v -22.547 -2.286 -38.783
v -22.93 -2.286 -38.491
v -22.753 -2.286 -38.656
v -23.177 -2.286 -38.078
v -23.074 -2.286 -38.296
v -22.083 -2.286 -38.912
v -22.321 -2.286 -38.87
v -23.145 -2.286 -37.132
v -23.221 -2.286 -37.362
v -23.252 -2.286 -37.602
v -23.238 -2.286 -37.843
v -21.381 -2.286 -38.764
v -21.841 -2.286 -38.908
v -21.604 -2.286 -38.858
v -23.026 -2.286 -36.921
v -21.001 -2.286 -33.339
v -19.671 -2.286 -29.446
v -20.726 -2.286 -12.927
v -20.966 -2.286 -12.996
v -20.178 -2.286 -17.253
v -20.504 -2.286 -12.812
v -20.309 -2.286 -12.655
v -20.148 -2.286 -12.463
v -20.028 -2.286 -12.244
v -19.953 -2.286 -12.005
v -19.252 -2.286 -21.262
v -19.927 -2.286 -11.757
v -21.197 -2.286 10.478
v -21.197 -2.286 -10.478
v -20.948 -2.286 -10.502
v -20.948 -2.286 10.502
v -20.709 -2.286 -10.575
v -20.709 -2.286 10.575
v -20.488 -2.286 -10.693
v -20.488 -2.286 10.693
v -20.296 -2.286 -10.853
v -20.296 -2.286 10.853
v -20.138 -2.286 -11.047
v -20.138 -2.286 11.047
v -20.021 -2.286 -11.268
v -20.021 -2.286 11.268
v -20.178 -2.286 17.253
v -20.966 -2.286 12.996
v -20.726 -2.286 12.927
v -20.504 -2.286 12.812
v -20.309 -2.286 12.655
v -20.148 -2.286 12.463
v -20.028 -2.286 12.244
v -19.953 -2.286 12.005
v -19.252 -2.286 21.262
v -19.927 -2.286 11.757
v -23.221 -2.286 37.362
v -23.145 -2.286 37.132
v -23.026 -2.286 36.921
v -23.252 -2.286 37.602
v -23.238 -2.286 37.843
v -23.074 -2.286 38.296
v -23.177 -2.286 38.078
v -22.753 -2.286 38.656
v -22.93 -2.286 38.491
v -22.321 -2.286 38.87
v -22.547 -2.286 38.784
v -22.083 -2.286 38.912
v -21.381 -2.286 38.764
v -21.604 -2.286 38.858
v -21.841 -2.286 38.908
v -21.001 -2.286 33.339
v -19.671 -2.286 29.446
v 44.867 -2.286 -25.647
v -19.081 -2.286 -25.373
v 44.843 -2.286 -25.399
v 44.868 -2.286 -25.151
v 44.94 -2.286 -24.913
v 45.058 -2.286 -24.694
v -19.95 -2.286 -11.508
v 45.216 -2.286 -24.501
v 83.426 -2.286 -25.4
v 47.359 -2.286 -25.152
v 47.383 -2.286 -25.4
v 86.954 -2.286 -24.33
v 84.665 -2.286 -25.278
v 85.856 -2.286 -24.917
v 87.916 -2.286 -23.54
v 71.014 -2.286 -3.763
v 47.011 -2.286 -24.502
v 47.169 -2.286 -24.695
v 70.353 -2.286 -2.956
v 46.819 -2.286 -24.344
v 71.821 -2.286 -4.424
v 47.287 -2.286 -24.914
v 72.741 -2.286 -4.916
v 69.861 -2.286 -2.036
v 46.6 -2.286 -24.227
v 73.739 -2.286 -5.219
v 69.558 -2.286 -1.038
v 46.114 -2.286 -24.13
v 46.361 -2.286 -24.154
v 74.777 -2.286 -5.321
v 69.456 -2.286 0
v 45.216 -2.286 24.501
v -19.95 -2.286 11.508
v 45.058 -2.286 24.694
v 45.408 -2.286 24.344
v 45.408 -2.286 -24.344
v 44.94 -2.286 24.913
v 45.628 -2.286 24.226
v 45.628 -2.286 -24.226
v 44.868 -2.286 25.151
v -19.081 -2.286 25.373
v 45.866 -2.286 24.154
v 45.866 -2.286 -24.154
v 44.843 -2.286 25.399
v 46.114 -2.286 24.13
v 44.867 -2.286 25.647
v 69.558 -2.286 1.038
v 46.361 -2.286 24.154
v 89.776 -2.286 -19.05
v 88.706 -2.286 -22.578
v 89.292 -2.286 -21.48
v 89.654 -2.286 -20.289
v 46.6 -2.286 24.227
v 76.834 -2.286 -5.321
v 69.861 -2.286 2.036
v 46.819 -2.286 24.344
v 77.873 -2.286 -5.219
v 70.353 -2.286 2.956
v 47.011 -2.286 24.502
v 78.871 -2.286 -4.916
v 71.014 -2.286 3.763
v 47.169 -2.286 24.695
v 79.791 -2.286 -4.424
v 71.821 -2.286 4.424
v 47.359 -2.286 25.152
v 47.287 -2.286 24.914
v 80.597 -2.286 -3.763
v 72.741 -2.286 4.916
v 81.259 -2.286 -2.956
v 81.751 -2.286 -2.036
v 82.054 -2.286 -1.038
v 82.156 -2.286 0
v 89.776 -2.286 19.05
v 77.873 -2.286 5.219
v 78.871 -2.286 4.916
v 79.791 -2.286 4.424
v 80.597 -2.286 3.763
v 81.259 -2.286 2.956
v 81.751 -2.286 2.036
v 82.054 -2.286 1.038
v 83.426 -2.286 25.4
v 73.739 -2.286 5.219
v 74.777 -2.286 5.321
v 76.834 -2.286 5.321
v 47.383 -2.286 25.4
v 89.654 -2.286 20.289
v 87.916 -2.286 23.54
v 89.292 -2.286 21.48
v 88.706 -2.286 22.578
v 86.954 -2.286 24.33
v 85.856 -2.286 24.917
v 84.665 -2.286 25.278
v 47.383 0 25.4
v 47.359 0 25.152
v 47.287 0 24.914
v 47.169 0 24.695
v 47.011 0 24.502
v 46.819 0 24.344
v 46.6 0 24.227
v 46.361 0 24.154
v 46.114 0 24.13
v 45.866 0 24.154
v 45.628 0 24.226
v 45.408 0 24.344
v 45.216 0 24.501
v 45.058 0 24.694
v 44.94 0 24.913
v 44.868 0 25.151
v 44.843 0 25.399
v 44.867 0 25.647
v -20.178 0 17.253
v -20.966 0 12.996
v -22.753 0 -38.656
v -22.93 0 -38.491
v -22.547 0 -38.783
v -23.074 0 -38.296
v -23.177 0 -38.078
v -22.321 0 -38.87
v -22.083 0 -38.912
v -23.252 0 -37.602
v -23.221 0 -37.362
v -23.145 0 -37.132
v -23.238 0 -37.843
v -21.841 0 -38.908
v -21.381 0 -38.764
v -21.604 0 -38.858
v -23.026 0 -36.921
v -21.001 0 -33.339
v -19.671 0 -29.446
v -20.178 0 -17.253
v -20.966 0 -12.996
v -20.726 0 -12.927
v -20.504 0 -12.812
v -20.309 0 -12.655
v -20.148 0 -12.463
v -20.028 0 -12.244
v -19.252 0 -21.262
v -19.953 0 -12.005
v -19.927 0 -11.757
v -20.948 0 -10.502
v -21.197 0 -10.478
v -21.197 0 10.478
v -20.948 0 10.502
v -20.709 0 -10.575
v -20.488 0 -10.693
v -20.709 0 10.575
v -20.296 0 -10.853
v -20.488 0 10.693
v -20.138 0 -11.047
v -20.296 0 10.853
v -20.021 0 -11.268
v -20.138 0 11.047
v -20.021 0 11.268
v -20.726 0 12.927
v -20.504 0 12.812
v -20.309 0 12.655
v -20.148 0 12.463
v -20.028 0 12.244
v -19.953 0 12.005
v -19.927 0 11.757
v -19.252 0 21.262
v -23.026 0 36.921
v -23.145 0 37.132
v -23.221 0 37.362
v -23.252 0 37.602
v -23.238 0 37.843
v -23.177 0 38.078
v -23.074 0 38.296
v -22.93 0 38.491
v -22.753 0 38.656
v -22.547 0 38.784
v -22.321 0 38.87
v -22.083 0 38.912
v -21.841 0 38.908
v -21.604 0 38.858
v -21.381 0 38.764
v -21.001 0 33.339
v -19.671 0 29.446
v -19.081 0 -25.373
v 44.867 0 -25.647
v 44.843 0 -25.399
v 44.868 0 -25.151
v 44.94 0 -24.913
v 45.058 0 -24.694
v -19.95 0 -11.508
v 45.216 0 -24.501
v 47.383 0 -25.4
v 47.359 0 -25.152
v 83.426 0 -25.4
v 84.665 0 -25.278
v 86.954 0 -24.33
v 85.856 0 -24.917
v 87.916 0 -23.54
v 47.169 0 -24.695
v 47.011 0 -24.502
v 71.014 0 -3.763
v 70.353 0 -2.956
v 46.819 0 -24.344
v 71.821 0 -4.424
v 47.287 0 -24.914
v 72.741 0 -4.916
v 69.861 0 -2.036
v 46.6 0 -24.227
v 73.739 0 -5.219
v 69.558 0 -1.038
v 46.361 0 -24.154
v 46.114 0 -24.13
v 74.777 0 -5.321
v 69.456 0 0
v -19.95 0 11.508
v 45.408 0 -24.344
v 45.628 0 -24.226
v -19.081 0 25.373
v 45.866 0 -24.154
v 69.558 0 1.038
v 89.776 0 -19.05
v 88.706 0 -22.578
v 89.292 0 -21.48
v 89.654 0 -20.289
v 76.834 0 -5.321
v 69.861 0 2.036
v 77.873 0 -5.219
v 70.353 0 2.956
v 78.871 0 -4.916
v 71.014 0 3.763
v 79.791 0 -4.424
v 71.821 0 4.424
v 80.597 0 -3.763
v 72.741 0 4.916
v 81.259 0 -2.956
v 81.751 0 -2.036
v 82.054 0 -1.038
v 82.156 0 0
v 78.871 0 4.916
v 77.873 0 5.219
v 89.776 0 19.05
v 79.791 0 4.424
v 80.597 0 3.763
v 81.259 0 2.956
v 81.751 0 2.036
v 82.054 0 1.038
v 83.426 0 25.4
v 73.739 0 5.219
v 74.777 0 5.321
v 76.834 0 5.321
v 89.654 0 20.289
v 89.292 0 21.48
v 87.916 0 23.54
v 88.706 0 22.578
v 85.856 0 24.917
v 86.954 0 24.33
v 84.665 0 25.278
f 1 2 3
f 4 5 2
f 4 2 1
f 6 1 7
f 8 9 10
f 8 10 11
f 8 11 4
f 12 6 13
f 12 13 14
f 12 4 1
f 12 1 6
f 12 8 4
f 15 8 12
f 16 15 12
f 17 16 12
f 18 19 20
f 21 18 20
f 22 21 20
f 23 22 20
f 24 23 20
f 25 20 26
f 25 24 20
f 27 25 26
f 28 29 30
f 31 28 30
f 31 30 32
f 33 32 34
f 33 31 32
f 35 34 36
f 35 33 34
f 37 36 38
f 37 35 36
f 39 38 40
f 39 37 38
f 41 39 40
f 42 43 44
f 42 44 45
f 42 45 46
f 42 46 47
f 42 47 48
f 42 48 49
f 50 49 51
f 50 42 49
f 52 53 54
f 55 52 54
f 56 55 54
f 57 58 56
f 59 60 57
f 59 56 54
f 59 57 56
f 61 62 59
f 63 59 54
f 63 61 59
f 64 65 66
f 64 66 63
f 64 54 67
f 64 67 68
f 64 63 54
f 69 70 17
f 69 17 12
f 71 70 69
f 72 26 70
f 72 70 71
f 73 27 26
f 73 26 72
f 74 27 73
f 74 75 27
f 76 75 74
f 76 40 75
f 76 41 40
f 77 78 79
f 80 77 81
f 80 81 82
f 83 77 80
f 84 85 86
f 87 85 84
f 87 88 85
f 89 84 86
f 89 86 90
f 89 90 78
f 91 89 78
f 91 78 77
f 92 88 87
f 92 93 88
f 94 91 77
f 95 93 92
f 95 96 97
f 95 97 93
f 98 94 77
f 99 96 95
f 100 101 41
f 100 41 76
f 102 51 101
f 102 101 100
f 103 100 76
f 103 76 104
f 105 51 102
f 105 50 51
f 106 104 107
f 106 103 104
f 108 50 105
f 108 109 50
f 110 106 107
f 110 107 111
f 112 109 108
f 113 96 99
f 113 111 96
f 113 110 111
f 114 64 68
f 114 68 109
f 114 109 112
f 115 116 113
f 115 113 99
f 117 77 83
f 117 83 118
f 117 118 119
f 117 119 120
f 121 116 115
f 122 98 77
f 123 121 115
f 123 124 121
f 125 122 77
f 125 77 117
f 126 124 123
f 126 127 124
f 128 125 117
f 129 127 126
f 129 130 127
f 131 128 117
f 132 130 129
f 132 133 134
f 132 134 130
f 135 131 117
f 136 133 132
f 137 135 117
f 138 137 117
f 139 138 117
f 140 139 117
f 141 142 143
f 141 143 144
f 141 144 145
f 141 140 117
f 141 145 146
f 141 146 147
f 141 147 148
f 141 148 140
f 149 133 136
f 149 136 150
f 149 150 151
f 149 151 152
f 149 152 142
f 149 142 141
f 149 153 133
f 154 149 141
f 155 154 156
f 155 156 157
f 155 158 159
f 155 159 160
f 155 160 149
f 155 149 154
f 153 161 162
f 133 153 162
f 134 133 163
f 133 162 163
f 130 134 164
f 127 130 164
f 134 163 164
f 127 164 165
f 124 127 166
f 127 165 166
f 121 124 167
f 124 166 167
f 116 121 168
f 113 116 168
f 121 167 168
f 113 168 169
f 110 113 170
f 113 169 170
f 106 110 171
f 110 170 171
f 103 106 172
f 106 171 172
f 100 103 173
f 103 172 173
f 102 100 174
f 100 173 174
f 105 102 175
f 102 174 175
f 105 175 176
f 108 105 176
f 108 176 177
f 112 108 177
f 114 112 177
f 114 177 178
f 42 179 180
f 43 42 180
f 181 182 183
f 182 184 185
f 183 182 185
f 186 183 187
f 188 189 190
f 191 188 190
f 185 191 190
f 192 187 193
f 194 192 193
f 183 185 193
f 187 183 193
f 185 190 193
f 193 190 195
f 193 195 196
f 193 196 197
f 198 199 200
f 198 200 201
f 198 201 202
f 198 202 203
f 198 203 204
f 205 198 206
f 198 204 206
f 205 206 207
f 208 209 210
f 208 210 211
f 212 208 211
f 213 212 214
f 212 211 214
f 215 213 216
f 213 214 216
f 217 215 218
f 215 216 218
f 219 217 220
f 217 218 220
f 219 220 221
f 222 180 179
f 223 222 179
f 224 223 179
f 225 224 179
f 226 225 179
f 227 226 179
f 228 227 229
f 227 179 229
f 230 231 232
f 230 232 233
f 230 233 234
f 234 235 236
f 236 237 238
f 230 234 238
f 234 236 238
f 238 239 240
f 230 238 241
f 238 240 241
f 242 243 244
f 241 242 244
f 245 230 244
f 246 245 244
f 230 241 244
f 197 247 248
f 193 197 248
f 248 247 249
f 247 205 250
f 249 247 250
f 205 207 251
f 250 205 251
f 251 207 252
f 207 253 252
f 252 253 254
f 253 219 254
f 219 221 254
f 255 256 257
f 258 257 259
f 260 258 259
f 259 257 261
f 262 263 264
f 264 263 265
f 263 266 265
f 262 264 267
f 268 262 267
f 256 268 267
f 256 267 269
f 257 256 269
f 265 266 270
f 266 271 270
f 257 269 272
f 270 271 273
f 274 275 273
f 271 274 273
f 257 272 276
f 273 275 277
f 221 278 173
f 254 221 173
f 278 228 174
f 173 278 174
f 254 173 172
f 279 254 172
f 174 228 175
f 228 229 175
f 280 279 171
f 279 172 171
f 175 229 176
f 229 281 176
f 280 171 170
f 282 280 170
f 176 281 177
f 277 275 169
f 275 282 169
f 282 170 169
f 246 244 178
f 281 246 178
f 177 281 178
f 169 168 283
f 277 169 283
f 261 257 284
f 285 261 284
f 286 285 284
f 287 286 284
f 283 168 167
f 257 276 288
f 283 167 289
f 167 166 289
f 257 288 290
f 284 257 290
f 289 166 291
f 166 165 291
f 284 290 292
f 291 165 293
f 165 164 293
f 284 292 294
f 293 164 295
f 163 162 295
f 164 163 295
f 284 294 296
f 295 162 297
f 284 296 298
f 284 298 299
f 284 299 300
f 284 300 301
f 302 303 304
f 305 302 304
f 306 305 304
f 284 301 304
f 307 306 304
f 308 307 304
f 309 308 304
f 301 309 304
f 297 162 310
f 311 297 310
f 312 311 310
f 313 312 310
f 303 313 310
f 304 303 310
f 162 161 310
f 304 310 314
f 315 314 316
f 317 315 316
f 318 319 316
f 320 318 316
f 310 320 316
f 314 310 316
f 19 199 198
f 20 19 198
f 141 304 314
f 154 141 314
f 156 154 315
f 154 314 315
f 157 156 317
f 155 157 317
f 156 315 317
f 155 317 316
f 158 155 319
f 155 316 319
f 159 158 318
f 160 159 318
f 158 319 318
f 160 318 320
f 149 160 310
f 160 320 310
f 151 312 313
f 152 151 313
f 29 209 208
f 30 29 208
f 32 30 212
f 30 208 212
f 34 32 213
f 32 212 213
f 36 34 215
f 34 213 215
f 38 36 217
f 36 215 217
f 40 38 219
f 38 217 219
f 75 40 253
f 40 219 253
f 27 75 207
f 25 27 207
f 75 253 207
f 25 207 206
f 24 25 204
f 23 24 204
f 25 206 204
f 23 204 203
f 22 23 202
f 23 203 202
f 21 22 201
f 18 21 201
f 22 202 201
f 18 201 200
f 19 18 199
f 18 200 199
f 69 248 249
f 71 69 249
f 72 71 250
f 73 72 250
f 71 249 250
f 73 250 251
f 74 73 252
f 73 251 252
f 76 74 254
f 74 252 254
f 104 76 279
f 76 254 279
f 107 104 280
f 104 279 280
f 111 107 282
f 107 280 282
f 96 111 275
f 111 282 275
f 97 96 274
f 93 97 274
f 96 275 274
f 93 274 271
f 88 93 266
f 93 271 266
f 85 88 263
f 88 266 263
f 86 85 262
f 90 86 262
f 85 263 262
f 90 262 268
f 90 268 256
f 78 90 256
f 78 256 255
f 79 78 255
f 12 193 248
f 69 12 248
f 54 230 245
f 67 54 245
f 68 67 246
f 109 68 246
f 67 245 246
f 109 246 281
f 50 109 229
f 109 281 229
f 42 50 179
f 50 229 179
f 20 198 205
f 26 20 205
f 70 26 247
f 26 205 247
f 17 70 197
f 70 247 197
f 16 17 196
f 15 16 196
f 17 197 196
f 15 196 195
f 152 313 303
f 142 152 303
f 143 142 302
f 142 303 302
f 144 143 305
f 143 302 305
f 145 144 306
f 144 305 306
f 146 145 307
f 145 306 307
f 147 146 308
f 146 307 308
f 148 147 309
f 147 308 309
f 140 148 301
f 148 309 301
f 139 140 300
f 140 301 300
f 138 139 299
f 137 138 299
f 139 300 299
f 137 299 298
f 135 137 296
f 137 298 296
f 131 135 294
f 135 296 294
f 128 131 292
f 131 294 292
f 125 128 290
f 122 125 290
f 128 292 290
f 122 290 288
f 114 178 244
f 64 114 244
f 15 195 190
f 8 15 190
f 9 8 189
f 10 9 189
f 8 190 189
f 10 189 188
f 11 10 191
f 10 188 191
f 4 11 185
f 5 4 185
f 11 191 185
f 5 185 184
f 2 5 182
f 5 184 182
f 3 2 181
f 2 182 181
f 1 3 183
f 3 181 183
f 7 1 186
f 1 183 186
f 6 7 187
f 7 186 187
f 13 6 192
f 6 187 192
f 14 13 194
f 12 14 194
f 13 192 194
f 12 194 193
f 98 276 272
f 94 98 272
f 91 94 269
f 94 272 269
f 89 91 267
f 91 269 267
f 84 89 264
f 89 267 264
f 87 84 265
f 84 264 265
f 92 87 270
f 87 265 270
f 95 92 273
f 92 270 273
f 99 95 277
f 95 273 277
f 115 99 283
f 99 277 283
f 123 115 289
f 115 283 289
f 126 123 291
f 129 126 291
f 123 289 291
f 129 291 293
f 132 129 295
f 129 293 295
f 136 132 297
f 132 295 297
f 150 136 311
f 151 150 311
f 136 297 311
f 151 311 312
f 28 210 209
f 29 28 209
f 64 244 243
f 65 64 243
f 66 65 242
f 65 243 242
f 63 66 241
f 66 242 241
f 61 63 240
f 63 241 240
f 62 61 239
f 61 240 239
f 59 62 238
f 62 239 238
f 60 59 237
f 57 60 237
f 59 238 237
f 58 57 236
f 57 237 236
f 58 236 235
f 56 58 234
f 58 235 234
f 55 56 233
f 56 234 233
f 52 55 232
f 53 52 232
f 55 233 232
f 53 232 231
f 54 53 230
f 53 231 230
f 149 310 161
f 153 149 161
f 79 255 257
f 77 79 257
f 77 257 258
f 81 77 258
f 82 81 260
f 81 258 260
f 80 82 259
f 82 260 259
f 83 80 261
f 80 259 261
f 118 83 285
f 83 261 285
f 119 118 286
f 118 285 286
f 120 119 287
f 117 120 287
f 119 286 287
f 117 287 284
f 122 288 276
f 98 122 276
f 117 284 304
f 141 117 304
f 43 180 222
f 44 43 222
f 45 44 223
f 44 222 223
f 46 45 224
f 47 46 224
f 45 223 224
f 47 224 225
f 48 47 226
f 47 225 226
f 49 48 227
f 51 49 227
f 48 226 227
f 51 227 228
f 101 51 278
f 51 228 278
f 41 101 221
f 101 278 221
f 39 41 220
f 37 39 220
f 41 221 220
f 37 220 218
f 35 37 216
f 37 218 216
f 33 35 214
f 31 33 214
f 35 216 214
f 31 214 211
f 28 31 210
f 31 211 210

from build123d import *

# Parameters (mm, degrees)
F1_DEPTH = 2.286


# Not quite as in the source:
# - ends of sketch curves that miss each other by under 0.0002 mm in the source are joined


with BuildPart() as f1:
    # F0 (on Front) → F1 (new body)
    with BuildSketch(Plane.XZ):
        with BuildLine():
            ThreePointArc((-20.1784623574, -17.2534296725), (-19.281646508, -27.4231568168), (-23.0260908036, -36.9208810585))
            ThreePointArc((-23.0260908036, -36.9208810585), (-22.9304929279, -38.4914502694), (-21.3807341969, -38.7636168977))
            Line((-21.3807341969, -38.7636168977), (44.86735167, -25.6466681175))
            ThreePointArc((44.86735167, -25.6466681175), (45.9892411408, -24.1360607291), (47.3831666, -25.4))
            Line((47.3831666, -25.4), (76.8344666, -5.3213))
            Line((76.8344666, -5.3213), (74.7770666, -5.3213))
            ThreePointArc((74.7770666, -5.3213), (69.4557666, 0), (74.7770666, 5.3213))
            Line((74.7770666, 5.3213), (76.8344666, 5.3213))
            Line((76.8344666, 5.3213), (47.3831666, 25.4))
            ThreePointArc((47.3831666, 25.4), (45.9892409445, 24.1360607483), (44.8673517466, 25.6466685044))
            Line((44.8673517466, 25.6466685044), (-21.38072359, 38.7636365822))
            ThreePointArc((-21.38072359, 38.7636365822), (-22.9304889155, 38.4914801631), (-23.026090887, 36.9209064006))
            ThreePointArc((-23.026090887, 36.9209064006), (-19.281646508, 27.4231822168), (-20.1784623574, 17.2534550725))
            Line((-20.1784623574, 17.2534550725), (-20.9658562769, 12.9963192698))
            ThreePointArc((-20.9658562769, 12.9963192698), (-19.9321396678, 11.6315268838), (-21.1968334, 10.4775))
            Line((-21.1968334, 10.4775), (-21.1968334, -10.4775))
            ThreePointArc((-21.1968334, -10.4775), (-19.9321397156, -11.6315263621), (-20.9658552466, -12.9963190792))
            Line((-20.9658552466, -12.9963190792), (-20.1784623574, -17.2534296725))
        make_face()
        with BuildLine():
            Line((76.8344666, -5.3213), (47.3831666, -25.4))
            Line((47.3831666, -25.4), (83.4257666, -25.4))
            ThreePointArc((83.4257666, -25.4), (87.9158946605, -23.5401280605), (89.7757666, -19.05))
            Line((89.7757666, -19.05), (89.7757666, 19.05))
            ThreePointArc((89.7757666, 19.05), (87.9158946605, 23.5401280605), (83.4257666, 25.4))
            Line((83.4257666, 25.4), (47.3831666, 25.4))
            Line((47.3831666, 25.4), (76.8344666, 5.3213))
            ThreePointArc((76.8344666, 5.3213), (82.1557666, 0), (76.8344666, -5.3213))
        make_face()
    extrude(amount=F1_DEPTH)


solid = f1.part
